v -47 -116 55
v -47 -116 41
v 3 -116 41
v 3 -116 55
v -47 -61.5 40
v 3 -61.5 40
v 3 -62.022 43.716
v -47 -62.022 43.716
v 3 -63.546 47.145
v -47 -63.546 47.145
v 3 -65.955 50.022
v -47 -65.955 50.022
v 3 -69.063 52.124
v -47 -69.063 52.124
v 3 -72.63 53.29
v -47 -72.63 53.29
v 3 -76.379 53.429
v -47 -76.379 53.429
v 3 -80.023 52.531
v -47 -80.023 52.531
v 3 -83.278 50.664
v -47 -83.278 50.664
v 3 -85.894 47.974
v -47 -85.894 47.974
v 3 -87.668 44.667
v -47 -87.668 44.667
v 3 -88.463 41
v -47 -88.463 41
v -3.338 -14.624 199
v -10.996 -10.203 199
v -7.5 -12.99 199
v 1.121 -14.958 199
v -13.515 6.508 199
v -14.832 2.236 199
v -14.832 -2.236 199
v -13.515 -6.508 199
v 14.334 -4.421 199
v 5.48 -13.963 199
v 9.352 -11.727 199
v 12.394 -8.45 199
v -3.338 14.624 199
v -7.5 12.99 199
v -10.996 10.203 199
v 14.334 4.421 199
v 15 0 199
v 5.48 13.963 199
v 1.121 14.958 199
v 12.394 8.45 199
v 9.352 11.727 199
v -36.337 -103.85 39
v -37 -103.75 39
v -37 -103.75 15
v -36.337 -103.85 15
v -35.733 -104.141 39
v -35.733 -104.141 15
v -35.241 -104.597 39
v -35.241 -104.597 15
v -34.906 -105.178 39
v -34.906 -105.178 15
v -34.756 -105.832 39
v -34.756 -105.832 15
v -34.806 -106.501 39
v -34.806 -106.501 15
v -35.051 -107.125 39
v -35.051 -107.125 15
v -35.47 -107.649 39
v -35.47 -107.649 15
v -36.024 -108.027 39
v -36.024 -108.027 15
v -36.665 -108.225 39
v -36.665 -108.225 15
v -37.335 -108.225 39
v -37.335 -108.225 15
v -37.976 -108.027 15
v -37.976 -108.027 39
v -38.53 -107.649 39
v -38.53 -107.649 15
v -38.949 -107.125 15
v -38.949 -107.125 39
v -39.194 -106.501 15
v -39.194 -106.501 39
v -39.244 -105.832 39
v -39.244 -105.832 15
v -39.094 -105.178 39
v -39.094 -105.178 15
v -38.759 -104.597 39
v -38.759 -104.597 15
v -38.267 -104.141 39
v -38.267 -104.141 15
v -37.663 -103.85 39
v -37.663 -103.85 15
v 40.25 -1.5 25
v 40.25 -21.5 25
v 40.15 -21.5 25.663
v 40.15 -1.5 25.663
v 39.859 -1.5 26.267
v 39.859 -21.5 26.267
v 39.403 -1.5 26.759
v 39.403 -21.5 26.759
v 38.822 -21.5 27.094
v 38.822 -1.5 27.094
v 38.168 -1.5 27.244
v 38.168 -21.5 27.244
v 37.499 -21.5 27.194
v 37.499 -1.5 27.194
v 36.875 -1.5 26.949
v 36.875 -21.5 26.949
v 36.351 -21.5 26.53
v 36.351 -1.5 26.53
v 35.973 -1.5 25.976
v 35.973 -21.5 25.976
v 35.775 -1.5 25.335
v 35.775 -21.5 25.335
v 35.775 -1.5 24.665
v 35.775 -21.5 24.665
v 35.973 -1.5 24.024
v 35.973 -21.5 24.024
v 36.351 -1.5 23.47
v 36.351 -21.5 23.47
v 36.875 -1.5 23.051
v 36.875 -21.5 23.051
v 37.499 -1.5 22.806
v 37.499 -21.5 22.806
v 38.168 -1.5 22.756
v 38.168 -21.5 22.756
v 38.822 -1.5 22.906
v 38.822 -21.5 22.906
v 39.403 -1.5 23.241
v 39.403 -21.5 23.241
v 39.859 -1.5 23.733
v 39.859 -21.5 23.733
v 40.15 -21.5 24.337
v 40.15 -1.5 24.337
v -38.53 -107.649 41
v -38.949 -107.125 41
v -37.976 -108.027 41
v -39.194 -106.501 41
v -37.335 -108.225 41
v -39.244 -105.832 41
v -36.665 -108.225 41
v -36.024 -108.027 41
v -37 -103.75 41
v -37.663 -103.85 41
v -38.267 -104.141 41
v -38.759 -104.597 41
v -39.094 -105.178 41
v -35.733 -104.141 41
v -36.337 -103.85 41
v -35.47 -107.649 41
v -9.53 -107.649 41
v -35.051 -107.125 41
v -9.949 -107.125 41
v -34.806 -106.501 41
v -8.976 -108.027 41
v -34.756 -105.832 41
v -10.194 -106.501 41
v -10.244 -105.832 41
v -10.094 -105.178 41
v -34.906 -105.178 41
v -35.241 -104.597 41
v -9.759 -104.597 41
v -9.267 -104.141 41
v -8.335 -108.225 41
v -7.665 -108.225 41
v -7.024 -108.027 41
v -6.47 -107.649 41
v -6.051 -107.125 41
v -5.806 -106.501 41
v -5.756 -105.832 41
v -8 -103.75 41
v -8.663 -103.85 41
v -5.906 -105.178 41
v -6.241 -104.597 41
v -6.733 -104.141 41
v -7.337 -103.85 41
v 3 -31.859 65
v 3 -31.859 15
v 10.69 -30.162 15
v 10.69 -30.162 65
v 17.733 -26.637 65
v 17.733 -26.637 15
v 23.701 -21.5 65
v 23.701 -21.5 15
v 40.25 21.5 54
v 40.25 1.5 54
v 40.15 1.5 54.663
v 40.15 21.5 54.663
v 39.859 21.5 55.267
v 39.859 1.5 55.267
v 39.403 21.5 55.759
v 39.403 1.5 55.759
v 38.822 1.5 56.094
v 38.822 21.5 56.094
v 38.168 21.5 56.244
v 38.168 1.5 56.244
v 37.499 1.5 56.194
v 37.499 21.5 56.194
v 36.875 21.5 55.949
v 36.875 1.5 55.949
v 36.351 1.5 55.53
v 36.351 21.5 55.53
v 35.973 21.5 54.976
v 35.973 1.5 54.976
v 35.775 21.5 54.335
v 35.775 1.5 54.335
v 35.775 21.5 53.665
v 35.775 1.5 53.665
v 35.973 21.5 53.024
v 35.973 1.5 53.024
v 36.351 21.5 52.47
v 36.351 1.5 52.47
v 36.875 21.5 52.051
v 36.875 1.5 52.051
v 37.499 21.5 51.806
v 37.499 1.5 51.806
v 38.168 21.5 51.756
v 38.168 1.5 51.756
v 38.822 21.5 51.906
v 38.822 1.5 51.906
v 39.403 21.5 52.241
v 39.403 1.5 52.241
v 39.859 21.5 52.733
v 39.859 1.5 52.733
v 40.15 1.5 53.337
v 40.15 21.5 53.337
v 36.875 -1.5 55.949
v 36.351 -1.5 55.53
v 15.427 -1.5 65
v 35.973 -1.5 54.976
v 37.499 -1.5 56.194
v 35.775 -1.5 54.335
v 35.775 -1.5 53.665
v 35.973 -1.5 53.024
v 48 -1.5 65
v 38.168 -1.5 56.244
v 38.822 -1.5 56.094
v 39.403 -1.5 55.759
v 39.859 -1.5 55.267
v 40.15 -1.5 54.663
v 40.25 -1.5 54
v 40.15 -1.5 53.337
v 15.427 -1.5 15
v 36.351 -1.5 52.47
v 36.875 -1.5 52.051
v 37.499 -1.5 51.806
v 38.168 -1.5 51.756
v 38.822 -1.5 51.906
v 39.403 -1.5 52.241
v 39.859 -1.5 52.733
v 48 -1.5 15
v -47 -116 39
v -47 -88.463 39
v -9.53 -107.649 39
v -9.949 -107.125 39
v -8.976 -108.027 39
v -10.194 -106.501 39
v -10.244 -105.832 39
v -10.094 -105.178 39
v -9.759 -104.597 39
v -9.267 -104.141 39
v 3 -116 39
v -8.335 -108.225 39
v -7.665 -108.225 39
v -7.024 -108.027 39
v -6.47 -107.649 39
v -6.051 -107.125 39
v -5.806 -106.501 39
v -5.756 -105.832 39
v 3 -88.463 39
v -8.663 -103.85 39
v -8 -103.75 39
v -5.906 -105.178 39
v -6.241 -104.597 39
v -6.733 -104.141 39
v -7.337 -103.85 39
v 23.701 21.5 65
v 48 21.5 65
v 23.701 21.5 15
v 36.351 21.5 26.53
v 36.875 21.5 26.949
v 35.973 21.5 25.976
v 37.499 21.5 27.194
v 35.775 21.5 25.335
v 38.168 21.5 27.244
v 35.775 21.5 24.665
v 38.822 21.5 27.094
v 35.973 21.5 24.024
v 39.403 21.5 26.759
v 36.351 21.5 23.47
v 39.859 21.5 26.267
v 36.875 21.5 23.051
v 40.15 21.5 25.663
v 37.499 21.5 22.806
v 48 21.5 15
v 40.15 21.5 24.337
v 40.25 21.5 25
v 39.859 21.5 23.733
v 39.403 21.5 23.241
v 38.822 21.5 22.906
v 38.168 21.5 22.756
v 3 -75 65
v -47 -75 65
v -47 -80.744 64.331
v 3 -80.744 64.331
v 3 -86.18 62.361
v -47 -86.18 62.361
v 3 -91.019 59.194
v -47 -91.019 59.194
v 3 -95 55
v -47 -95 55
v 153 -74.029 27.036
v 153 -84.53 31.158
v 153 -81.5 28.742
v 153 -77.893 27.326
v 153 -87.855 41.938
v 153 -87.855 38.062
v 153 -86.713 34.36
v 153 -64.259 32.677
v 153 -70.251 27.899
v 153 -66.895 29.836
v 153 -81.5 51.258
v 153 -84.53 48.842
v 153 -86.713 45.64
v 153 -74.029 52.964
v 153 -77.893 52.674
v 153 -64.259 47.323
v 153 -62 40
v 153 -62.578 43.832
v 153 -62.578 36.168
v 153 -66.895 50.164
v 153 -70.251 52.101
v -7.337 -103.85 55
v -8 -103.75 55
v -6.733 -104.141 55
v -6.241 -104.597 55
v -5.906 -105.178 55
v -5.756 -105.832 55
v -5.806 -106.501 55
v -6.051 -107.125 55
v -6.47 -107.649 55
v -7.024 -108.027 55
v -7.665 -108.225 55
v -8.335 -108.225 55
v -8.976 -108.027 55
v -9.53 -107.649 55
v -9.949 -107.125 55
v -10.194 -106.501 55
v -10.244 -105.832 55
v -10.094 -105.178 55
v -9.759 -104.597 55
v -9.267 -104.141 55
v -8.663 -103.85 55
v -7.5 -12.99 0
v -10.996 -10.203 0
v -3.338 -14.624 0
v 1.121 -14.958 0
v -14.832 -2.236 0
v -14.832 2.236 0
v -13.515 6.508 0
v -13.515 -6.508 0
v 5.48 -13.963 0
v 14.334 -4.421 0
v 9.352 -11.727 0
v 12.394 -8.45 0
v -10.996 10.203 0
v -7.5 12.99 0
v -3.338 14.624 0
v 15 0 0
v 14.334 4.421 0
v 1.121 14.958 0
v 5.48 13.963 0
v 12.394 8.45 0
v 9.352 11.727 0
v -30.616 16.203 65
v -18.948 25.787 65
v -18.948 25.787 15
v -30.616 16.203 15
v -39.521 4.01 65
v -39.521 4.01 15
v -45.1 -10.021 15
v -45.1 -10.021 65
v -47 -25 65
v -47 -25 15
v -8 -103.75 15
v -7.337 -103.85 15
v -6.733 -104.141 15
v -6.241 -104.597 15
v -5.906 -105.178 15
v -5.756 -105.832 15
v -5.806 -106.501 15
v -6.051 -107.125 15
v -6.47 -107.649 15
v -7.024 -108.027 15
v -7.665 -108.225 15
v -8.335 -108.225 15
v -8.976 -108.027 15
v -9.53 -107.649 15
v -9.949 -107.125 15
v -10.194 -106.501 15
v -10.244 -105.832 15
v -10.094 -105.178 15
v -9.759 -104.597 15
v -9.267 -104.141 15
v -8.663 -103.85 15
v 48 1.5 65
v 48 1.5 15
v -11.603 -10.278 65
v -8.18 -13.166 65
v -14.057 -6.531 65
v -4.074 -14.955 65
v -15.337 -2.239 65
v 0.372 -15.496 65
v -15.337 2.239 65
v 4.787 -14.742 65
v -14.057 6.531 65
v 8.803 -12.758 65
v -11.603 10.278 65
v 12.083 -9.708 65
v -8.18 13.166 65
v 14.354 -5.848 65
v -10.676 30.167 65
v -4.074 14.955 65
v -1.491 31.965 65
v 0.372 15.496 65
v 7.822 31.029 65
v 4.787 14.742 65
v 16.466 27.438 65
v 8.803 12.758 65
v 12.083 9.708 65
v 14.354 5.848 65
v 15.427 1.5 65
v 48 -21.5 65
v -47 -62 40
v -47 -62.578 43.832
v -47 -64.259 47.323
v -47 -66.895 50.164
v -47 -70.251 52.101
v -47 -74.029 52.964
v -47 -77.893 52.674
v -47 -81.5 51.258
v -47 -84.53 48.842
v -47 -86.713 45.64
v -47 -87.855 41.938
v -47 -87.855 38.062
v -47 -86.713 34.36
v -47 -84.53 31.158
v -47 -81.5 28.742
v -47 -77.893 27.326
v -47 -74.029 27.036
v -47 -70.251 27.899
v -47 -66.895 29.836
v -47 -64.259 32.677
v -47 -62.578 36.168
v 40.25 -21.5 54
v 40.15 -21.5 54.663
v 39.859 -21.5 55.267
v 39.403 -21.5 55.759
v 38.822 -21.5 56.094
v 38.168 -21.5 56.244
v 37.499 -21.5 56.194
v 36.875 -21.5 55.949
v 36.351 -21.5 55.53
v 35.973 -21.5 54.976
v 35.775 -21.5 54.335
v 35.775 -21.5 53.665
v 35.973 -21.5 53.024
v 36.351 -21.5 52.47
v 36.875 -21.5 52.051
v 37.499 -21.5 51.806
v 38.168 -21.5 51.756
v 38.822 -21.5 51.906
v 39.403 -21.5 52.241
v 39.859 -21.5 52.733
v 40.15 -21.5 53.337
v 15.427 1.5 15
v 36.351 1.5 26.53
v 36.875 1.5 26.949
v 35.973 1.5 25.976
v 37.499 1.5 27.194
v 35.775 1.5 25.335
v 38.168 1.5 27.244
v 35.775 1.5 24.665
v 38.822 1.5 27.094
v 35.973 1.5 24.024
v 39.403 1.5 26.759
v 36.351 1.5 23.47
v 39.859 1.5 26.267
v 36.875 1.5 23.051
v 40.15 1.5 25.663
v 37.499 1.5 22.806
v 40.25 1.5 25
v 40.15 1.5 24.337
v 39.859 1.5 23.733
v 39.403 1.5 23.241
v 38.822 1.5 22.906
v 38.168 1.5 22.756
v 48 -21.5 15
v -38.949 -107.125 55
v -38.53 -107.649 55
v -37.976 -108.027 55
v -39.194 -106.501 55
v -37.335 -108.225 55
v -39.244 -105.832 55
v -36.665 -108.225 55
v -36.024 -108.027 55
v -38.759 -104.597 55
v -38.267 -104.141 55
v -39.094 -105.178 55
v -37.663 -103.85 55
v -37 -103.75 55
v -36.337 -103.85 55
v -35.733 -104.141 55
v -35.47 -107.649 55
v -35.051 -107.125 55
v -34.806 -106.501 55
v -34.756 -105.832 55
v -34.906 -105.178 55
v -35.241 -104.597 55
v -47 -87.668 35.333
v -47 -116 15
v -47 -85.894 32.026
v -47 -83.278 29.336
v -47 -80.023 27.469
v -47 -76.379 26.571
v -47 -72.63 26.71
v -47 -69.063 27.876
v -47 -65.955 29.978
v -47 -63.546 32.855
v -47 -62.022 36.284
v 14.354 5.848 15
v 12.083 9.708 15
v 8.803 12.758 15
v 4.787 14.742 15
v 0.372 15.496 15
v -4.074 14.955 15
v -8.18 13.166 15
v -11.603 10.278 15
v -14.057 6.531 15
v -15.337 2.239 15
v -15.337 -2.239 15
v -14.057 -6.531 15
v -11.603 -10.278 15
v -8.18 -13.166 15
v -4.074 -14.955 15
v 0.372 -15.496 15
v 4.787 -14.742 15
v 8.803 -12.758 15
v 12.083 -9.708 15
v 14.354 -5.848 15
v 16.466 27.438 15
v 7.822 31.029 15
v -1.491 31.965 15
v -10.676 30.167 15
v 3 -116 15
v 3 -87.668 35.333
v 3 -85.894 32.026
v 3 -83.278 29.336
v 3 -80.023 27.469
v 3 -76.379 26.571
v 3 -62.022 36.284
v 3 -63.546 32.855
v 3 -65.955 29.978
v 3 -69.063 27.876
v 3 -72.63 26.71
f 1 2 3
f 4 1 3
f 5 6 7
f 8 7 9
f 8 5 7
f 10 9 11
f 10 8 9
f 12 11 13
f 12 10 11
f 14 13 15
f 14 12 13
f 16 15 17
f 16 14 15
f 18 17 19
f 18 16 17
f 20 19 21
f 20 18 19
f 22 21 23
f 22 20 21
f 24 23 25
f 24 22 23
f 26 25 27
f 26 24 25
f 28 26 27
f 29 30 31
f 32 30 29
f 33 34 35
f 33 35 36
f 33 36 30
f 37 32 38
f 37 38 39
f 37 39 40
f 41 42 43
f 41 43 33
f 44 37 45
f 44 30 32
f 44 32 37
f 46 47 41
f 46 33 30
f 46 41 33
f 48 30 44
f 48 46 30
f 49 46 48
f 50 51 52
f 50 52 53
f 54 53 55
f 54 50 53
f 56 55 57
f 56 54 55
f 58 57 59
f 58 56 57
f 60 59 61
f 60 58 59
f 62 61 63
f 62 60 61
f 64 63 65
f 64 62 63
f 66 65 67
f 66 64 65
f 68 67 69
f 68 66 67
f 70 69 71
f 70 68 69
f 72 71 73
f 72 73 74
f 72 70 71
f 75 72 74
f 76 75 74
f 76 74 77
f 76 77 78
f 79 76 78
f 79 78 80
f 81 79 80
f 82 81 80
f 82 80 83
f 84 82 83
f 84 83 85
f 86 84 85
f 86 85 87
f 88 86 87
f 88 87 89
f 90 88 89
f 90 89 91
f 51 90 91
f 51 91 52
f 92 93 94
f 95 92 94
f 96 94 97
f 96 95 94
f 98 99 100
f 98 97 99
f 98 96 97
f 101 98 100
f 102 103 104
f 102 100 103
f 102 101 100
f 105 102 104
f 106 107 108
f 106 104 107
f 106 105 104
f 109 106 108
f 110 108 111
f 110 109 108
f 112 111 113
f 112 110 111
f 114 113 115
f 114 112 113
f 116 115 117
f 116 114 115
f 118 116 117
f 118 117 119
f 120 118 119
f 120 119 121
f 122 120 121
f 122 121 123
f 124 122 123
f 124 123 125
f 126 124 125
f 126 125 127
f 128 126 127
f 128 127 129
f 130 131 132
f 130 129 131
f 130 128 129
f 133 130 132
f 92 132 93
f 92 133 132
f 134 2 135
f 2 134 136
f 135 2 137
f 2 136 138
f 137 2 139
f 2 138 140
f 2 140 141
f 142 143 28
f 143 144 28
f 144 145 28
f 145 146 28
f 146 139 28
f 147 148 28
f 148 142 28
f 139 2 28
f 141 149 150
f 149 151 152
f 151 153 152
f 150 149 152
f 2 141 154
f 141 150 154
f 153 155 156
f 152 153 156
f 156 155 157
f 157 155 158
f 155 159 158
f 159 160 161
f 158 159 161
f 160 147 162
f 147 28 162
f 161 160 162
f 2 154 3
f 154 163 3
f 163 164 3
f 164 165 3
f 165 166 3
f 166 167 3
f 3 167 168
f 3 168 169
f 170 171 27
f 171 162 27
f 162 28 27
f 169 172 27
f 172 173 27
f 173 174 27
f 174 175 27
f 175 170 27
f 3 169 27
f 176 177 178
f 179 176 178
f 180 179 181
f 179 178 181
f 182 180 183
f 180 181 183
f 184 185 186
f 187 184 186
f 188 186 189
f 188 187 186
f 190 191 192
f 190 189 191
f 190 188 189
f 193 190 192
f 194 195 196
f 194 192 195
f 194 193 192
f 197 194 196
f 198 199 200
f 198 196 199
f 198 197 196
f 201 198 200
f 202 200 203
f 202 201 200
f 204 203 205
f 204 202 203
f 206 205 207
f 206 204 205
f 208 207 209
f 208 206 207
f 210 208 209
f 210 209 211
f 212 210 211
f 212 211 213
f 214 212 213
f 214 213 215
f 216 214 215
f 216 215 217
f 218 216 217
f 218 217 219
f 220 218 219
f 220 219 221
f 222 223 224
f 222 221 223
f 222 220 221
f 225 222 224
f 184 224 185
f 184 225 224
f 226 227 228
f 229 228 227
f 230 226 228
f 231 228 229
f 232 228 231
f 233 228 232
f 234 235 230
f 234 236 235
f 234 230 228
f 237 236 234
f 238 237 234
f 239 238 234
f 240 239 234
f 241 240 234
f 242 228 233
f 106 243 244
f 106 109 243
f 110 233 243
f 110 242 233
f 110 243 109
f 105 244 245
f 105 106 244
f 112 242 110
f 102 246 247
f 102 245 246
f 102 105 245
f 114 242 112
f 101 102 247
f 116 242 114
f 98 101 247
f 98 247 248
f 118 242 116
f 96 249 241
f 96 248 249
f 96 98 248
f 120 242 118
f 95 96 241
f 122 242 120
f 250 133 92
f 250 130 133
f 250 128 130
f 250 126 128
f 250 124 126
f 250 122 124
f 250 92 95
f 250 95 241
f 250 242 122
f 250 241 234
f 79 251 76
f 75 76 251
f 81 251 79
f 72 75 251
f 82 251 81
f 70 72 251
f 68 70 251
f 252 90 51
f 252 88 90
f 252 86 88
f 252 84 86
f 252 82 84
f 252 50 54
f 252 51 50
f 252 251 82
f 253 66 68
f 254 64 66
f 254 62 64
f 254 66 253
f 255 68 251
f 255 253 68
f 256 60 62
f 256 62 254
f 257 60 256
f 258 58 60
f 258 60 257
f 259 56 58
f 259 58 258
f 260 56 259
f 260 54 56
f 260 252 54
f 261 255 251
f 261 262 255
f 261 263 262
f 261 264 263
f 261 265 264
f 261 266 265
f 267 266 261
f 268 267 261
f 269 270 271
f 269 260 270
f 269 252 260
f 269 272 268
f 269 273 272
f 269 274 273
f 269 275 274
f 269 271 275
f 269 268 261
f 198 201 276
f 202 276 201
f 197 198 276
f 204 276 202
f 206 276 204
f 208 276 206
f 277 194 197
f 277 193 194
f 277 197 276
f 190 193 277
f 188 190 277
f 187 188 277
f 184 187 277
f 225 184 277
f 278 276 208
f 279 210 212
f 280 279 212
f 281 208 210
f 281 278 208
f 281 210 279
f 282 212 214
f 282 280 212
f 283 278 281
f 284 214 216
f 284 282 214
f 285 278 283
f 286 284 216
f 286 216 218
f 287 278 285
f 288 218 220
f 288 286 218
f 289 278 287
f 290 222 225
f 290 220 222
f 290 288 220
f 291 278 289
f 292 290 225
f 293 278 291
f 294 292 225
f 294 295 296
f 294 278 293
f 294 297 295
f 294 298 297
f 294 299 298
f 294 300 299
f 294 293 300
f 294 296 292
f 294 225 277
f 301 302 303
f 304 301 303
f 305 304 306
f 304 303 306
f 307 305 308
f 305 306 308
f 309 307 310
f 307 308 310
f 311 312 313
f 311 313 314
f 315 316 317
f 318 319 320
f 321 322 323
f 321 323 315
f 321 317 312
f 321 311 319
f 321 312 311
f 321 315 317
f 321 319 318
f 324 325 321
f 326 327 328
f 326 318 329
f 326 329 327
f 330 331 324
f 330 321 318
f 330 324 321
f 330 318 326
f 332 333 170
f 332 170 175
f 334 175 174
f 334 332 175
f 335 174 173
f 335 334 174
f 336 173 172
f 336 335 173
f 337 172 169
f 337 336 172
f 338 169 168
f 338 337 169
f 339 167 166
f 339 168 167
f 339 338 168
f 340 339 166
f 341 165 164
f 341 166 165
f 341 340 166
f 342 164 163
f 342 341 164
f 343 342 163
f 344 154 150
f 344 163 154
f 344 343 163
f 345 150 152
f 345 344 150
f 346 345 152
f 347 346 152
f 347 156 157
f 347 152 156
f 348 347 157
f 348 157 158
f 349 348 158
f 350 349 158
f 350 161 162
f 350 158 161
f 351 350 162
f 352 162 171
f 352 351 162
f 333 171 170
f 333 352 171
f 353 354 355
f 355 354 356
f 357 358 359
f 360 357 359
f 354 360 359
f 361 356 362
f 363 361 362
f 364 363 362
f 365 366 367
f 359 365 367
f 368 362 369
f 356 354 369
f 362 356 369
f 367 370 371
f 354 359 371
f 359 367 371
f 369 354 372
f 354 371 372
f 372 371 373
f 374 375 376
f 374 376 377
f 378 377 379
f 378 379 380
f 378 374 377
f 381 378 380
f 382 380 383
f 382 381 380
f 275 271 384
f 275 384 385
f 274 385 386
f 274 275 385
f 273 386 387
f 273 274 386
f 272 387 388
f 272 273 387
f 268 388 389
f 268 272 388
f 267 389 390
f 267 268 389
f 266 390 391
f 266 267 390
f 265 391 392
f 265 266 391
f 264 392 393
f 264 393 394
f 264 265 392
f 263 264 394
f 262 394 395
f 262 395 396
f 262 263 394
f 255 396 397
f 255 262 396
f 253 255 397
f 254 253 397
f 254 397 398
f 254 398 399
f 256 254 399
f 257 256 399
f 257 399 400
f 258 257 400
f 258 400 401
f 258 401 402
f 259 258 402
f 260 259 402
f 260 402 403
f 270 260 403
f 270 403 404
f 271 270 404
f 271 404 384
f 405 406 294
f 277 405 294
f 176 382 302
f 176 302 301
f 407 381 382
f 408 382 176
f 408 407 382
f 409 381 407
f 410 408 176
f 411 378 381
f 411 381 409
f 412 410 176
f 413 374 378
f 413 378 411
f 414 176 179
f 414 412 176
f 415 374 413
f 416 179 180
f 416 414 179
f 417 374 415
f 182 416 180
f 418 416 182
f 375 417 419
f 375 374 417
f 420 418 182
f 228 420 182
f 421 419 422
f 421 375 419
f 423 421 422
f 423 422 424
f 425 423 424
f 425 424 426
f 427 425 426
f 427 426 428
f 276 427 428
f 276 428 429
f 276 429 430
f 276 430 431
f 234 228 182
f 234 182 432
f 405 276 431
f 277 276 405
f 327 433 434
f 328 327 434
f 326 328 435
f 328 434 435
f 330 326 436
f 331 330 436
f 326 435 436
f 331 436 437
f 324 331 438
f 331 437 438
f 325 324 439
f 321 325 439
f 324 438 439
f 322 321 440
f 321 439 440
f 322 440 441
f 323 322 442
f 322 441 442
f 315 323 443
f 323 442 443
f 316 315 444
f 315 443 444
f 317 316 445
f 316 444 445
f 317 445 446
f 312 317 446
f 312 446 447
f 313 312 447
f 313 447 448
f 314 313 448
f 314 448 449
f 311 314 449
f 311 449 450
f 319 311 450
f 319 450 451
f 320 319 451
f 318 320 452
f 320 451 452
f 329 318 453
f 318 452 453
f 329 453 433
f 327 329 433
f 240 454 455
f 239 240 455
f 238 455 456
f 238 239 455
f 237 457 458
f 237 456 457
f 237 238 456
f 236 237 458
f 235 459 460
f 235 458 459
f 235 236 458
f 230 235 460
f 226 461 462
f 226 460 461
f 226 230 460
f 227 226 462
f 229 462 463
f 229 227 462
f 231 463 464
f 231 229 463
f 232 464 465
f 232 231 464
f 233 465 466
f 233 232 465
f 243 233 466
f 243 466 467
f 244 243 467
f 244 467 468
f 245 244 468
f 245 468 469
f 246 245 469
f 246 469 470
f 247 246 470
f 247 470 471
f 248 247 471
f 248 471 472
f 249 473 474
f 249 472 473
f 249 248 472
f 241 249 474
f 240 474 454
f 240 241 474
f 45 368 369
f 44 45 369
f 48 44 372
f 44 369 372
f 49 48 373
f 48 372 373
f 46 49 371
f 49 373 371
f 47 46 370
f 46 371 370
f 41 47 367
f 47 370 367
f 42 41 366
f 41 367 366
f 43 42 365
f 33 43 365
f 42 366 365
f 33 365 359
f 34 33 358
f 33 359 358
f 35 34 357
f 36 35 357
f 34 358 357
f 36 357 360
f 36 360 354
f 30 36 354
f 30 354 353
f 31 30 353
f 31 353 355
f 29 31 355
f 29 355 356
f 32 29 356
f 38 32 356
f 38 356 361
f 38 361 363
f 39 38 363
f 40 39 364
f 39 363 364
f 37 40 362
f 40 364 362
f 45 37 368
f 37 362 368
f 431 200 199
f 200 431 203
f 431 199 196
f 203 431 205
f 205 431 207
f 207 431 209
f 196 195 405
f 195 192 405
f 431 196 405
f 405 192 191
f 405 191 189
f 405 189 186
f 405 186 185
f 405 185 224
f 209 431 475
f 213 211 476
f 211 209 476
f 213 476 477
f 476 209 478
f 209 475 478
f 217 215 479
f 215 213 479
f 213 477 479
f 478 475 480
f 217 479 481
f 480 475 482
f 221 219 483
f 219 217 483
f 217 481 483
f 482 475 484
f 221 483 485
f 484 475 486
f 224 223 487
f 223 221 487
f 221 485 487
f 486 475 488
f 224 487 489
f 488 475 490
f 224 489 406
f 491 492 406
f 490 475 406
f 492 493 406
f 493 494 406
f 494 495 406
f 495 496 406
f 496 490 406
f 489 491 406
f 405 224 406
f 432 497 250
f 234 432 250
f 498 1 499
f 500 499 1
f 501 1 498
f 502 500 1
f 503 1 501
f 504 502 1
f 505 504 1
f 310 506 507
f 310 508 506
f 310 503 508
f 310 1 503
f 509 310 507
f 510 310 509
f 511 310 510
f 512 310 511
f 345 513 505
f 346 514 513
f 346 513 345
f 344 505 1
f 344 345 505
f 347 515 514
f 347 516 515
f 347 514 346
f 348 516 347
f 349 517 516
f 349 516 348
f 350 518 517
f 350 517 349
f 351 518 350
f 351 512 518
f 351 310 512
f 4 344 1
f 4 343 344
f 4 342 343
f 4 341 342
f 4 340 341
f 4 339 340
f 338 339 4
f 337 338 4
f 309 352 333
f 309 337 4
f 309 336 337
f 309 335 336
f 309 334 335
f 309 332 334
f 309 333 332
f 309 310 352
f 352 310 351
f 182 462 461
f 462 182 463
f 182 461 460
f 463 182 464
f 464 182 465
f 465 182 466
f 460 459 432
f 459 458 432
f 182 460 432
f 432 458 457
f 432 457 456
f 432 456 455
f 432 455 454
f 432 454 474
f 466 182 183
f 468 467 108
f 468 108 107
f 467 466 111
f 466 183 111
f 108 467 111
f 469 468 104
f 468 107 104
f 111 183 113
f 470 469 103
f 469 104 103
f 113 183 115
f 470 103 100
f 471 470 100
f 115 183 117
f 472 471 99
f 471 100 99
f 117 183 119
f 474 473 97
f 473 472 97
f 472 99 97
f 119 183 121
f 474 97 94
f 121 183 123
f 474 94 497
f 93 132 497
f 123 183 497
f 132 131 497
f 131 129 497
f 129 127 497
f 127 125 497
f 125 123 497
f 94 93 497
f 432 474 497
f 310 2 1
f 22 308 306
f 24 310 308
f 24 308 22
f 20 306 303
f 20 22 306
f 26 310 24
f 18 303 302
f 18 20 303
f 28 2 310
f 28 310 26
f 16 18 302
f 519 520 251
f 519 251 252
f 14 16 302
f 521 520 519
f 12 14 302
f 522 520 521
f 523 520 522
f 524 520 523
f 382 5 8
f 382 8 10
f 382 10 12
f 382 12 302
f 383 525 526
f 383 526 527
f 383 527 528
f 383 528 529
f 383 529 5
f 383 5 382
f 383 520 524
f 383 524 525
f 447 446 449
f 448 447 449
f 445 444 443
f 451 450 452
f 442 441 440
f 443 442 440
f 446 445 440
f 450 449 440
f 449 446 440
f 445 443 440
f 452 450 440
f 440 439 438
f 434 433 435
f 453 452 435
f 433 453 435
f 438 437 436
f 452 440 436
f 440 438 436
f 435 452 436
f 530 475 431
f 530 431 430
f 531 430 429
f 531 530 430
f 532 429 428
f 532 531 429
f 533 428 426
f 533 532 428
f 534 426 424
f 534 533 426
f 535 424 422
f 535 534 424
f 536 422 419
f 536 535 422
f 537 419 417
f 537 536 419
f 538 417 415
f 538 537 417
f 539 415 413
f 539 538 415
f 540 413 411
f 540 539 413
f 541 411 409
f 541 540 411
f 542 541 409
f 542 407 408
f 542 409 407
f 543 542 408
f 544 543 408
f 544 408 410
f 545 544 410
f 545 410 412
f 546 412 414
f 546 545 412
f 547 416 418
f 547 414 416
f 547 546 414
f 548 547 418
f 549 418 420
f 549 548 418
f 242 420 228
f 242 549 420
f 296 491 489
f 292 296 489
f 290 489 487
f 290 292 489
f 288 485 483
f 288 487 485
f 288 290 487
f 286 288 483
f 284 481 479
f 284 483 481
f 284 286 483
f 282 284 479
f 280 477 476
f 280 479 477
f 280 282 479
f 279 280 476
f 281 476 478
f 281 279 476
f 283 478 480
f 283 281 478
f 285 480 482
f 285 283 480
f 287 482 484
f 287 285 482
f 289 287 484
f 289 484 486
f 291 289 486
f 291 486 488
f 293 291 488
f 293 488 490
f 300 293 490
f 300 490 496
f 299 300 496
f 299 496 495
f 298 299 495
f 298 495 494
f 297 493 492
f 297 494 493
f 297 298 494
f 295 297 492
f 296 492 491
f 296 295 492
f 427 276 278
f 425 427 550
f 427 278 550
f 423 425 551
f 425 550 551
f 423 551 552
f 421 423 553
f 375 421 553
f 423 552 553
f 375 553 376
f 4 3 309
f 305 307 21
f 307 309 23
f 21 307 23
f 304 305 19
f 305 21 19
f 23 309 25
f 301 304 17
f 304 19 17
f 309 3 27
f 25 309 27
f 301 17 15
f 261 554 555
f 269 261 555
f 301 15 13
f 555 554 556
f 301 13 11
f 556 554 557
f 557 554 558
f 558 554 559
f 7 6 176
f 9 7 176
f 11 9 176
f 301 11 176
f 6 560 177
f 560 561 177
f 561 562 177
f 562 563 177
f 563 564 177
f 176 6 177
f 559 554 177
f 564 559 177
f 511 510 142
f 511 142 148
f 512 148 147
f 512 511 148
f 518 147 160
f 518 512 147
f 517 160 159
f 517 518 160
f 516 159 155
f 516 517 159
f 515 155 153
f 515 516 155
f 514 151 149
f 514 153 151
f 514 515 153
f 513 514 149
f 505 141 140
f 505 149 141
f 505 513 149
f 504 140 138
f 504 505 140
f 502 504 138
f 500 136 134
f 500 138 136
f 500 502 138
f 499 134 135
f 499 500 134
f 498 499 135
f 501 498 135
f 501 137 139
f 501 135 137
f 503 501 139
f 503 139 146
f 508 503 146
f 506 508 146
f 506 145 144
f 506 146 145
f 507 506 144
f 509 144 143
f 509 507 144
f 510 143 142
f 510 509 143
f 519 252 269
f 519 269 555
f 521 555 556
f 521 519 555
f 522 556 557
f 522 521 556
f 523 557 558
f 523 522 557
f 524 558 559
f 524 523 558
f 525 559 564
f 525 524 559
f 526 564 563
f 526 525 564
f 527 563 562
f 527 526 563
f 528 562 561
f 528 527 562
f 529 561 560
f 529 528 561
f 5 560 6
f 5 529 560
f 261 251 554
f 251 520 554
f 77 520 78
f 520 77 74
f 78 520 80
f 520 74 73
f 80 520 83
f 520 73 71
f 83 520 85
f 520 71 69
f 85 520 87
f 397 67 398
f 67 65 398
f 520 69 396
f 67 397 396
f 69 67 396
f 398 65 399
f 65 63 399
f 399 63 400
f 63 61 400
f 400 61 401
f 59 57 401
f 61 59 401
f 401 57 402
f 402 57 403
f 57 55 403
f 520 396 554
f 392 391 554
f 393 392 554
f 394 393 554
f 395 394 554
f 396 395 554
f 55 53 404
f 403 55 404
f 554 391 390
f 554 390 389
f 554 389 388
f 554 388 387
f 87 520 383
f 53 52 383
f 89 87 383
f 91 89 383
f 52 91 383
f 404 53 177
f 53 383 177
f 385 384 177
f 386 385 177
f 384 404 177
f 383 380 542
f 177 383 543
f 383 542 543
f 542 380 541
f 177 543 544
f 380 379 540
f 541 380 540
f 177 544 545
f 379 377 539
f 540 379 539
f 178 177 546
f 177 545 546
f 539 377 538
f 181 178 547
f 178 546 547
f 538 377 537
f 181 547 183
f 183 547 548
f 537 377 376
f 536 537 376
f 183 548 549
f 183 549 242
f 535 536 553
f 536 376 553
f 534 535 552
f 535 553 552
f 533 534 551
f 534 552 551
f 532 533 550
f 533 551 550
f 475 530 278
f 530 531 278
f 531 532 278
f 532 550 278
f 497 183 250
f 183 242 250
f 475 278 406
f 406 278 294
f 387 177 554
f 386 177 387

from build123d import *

# Parameters (mm, degrees)
CYLINDER_R                  = 15
CYLINDER_DEPTH              = 199
CYLINDER001_R               = 13
CYLINDER001_DEPTH           = 200
CYLINDER005_R               = 2.25
CYLINDER005_DEPTH           = 50
CYLINDER006_R               = 2.25
CYLINDER006_DEPTH           = 50
FUSION_ROLL_ANGLE           = 90
FUSION_PLACEMENT_ANGLE      = 90
CYLINDER004_R               = 15.5
CYLINDER004_DEPTH           = 199
CYLINDER003_R               = 13.5
CYLINDER003_DEPTH           = 200
BOX_W                       = 20
BOX_H                       = 3
BOX_DEPTH                   = 50
BOX006_W                    = 50
BOX006_H                    = 27
BOX006_DEPTH                = 2
CYLINDER007_R               = 2.25
CYLINDER007_DEPTH           = 50
CYLINDER008_R               = 2.25
CYLINDER008_DEPTH           = 50
BOX001_W                    = 25
BOX001_H                    = 20
BOX001_DEPTH                = 50
BOX002_W                    = 25
BOX002_H                    = 20
BOX002_DEPTH                = 50
BOX003_W                    = 50
BOX003_H                    = 75
BOX003_DEPTH                = 10
BOX004_W                    = 50
BOX004_H                    = 52
BOX004_DEPTH                = 14
BOX005_W                    = 50
BOX005_H                    = 22
BOX005_DEPTH                = 14
CYLINDER002_W               = 60
CYLINDER002_H               = 50
CYLINDER002_ANGLE           = 60
CYLINDER002_PLACEMENT_ANGLE = 120
TUBE_R                      = 32
TUBE_R_2                    = 15.5
TUBE_DEPTH                  = 50
TUBE001_R                   = 25
TUBE001_R_2                 = 13.5
TUBE001_DEPTH               = 50
BOX007_W                    = 50
BOX007_H                    = 50
BOX007_DEPTH                = 50


with BuildPart() as horizontal:
    # Cylinder → Cylinder (new body)
    with BuildSketch(Plane.XY):
        Circle(CYLINDER_R)
    extrude(amount=CYLINDER_DEPTH)


with BuildPart() as vertical:
    # Cylinder001 → Cylinder001 (new body)
    with BuildSketch(Plane(origin=(-47, -75, 40), x_dir=(0, 1, 0), z_dir=(1, 0, 0))):
        Circle(CYLINDER001_R)
    extrude(amount=CYLINDER001_DEPTH)


with BuildPart() as m4s:
    # Cylinder005 → Cylinder005 (new body)
    with BuildSketch(Plane(origin=(38, 22, 25), x_dir=(1, 0, 0), z_dir=(0, -1, 0))):
        Circle(CYLINDER005_R)
    extrude(amount=CYLINDER005_DEPTH)


with BuildPart() as m4s002:
    # Cylinder006 → Cylinder006 (new body)
    with BuildSketch(Plane(origin=(38, 22, 54), x_dir=(1, 0, 0), z_dir=(0, -1, 0))):
        Circle(CYLINDER006_R)
    extrude(amount=CYLINDER006_DEPTH)

    # Fusion: union m4s
    add(m4s.part)


with BuildPart() as m4s002_1:
    # Fusion roll: moved
    add(m4s002.part.rotate(Axis((0, 0, 0), (1, 0, 0)), FUSION_ROLL_ANGLE))


with BuildPart() as m4s002_2:
    # Fusion placement: moved
    add(m4s002_1.part.moved(Location((-62, -144, 43))).rotate(Axis((-62, -144, 43), (0, 0, 1)), FUSION_PLACEMENT_ANGLE))


with BuildPart() as horizontal001cuts:
    # Cylinder004 → Cylinder004 (new body)
    with BuildSketch(Plane.XY):
        Circle(CYLINDER004_R)
    extrude(amount=CYLINDER004_DEPTH)


with BuildPart() as vertical001cuts:
    # Cylinder003 → Cylinder003 (new body)
    with BuildSketch(Plane(origin=(-47, -75, 40), x_dir=(0, 1, 0), z_dir=(1, 0, 0))):
        Circle(CYLINDER003_R)
    extrude(amount=CYLINDER003_DEPTH)


with BuildPart() as horcuts:
    # Box → Box (new body)
    with BuildSketch(Plane(origin=(14, -1.5, 15), x_dir=(1, 0, 0), z_dir=(0, 0, 1))):
        with Locations((10, 1.5)):
            Rectangle(BOX_W, BOX_H)
    extrude(amount=BOX_DEPTH)


with BuildPart() as vercuts:
    # Box006 → Box006 (new body)
    with BuildSketch(Plane(origin=(-47, -110, 39), x_dir=(1, 0, 0), z_dir=(0, 0, 1))):
        with Locations((25, 13.5)):
            Rectangle(BOX006_W, BOX006_H)
    extrude(amount=BOX006_DEPTH)


with BuildPart() as m4s004:
    # Cylinder007 → Cylinder007 (new body)
    with BuildSketch(Plane(origin=(38, 22, 25), x_dir=(1, 0, 0), z_dir=(0, -1, 0))):
        Circle(CYLINDER007_R)
    extrude(amount=CYLINDER007_DEPTH)


with BuildPart() as cuts:
    # Cylinder008 → Cylinder008 (new body)
    with BuildSketch(Plane(origin=(38, 22, 54), x_dir=(1, 0, 0), z_dir=(0, -1, 0))):
        Circle(CYLINDER008_R)
    extrude(amount=CYLINDER008_DEPTH)

    # Fusion001: union m4s004
    add(m4s004.part)

    # Fusion002: union m4s002, Horizontal001Cuts, Vertical001Cuts, horCuts, verCuts
    add(m4s002_2.part)
    add(horizontal001cuts.part)
    add(vertical001cuts.part)
    add(horcuts.part)
    add(vercuts.part)


with BuildPart() as horadd:
    # Box001 → Box001 (new body)
    with BuildSketch(Plane(origin=(23, -21.5, 15), x_dir=(1, 0, 0), z_dir=(0, 0, 1))):
        with Locations((12.5, 10)):
            Rectangle(BOX001_W, BOX001_H)
    extrude(amount=BOX001_DEPTH)


with BuildPart() as horadd001:
    # Box002 → Box002 (new body)
    with BuildSketch(Plane(origin=(23, 1.5, 15), x_dir=(1, 0, 0), z_dir=(0, 0, 1))):
        with Locations((12.5, 10)):
            Rectangle(BOX002_W, BOX002_H)
    extrude(amount=BOX002_DEPTH)


with BuildPart() as veraddons:
    # Box003 → Box003 (new body)
    with BuildSketch(Plane(origin=(-47, -116, 15), x_dir=(1, 0, 0), z_dir=(0, 0, 1))):
        with Locations((25, 37.5)):
            Rectangle(BOX003_W, BOX003_H)
    extrude(amount=BOX003_DEPTH)


with BuildPart() as veraddons001:
    # Box004 → Box004 (new body)
    with BuildSketch(Plane(origin=(-47, -116, 25), x_dir=(1, 0, 0), z_dir=(0, 0, 1))):
        with Locations((25, 26)):
            Rectangle(BOX004_W, BOX004_H)
    extrude(amount=BOX004_DEPTH)


with BuildPart() as veraddons002:
    # Box005 → Box005 (new body)
    with BuildSketch(Plane(origin=(-47, -116, 41), x_dir=(1, 0, 0), z_dir=(0, 0, 1))):
        with Locations((25, 11)):
            Rectangle(BOX005_W, BOX005_H)
    extrude(amount=BOX005_DEPTH)


with BuildPart() as addcylinder:
    # Cylinder002 → Cylinder002 (revolve)
    with BuildSketch(Plane.XZ):
        with Locations((30, 25)):
            Rectangle(CYLINDER002_W, CYLINDER002_H)
    revolve(axis=Axis((0, 0, 0), (0, 0, 1)), revolution_arc=CYLINDER002_ANGLE)


with BuildPart() as addcylinder_1:
    # Cylinder002 placement: moved
    add(addcylinder.part.moved(Location((13, -25, 15))).rotate(Axis((13, -25, 15), (0, 0, 1)), CYLINDER002_PLACEMENT_ANGLE))


with BuildPart() as tubeaddons:
    # Tube → Tube (new body)
    with BuildSketch(Plane.XY.offset(15)):
        Circle(TUBE_R)
        Circle(TUBE_R_2, mode=Mode.SUBTRACT)
    extrude(amount=TUBE_DEPTH)


with BuildPart() as tubeaddons001:
    # Tube001 → Tube001 (new body)
    with BuildSketch(Plane(origin=(-47, -75, 40), x_dir=(0, 0, -1), z_dir=(1, 0, 0))):
        Circle(TUBE001_R)
        Circle(TUBE001_R_2, mode=Mode.SUBTRACT)
    extrude(amount=TUBE001_DEPTH)


with BuildPart() as rear:
    # Box007 → Box007 (new body)
    with BuildSketch(Plane(origin=(-47, -75, 15), x_dir=(1, 0, 0), z_dir=(0, 0, 1))):
        with Locations((25, 25)):
            Rectangle(BOX007_W, BOX007_H)
    extrude(amount=BOX007_DEPTH)

    # Fusion003: union horAdd, horAdd001, VerAddons, VerAddons001, VerAddons002, AddCylinder, TubeAddons, TubeAddons001
    add(horadd.part)
    add(horadd001.part)
    add(veraddons.part)
    add(veraddons001.part)
    add(veraddons002.part)
    add(addcylinder_1.part)
    add(tubeaddons.part)
    add(tubeaddons001.part)

    # Cut: cut cuts
    add(cuts.part, mode=Mode.SUBTRACT)


solid = Compound([horizontal.part, vertical.part, rear.part])
